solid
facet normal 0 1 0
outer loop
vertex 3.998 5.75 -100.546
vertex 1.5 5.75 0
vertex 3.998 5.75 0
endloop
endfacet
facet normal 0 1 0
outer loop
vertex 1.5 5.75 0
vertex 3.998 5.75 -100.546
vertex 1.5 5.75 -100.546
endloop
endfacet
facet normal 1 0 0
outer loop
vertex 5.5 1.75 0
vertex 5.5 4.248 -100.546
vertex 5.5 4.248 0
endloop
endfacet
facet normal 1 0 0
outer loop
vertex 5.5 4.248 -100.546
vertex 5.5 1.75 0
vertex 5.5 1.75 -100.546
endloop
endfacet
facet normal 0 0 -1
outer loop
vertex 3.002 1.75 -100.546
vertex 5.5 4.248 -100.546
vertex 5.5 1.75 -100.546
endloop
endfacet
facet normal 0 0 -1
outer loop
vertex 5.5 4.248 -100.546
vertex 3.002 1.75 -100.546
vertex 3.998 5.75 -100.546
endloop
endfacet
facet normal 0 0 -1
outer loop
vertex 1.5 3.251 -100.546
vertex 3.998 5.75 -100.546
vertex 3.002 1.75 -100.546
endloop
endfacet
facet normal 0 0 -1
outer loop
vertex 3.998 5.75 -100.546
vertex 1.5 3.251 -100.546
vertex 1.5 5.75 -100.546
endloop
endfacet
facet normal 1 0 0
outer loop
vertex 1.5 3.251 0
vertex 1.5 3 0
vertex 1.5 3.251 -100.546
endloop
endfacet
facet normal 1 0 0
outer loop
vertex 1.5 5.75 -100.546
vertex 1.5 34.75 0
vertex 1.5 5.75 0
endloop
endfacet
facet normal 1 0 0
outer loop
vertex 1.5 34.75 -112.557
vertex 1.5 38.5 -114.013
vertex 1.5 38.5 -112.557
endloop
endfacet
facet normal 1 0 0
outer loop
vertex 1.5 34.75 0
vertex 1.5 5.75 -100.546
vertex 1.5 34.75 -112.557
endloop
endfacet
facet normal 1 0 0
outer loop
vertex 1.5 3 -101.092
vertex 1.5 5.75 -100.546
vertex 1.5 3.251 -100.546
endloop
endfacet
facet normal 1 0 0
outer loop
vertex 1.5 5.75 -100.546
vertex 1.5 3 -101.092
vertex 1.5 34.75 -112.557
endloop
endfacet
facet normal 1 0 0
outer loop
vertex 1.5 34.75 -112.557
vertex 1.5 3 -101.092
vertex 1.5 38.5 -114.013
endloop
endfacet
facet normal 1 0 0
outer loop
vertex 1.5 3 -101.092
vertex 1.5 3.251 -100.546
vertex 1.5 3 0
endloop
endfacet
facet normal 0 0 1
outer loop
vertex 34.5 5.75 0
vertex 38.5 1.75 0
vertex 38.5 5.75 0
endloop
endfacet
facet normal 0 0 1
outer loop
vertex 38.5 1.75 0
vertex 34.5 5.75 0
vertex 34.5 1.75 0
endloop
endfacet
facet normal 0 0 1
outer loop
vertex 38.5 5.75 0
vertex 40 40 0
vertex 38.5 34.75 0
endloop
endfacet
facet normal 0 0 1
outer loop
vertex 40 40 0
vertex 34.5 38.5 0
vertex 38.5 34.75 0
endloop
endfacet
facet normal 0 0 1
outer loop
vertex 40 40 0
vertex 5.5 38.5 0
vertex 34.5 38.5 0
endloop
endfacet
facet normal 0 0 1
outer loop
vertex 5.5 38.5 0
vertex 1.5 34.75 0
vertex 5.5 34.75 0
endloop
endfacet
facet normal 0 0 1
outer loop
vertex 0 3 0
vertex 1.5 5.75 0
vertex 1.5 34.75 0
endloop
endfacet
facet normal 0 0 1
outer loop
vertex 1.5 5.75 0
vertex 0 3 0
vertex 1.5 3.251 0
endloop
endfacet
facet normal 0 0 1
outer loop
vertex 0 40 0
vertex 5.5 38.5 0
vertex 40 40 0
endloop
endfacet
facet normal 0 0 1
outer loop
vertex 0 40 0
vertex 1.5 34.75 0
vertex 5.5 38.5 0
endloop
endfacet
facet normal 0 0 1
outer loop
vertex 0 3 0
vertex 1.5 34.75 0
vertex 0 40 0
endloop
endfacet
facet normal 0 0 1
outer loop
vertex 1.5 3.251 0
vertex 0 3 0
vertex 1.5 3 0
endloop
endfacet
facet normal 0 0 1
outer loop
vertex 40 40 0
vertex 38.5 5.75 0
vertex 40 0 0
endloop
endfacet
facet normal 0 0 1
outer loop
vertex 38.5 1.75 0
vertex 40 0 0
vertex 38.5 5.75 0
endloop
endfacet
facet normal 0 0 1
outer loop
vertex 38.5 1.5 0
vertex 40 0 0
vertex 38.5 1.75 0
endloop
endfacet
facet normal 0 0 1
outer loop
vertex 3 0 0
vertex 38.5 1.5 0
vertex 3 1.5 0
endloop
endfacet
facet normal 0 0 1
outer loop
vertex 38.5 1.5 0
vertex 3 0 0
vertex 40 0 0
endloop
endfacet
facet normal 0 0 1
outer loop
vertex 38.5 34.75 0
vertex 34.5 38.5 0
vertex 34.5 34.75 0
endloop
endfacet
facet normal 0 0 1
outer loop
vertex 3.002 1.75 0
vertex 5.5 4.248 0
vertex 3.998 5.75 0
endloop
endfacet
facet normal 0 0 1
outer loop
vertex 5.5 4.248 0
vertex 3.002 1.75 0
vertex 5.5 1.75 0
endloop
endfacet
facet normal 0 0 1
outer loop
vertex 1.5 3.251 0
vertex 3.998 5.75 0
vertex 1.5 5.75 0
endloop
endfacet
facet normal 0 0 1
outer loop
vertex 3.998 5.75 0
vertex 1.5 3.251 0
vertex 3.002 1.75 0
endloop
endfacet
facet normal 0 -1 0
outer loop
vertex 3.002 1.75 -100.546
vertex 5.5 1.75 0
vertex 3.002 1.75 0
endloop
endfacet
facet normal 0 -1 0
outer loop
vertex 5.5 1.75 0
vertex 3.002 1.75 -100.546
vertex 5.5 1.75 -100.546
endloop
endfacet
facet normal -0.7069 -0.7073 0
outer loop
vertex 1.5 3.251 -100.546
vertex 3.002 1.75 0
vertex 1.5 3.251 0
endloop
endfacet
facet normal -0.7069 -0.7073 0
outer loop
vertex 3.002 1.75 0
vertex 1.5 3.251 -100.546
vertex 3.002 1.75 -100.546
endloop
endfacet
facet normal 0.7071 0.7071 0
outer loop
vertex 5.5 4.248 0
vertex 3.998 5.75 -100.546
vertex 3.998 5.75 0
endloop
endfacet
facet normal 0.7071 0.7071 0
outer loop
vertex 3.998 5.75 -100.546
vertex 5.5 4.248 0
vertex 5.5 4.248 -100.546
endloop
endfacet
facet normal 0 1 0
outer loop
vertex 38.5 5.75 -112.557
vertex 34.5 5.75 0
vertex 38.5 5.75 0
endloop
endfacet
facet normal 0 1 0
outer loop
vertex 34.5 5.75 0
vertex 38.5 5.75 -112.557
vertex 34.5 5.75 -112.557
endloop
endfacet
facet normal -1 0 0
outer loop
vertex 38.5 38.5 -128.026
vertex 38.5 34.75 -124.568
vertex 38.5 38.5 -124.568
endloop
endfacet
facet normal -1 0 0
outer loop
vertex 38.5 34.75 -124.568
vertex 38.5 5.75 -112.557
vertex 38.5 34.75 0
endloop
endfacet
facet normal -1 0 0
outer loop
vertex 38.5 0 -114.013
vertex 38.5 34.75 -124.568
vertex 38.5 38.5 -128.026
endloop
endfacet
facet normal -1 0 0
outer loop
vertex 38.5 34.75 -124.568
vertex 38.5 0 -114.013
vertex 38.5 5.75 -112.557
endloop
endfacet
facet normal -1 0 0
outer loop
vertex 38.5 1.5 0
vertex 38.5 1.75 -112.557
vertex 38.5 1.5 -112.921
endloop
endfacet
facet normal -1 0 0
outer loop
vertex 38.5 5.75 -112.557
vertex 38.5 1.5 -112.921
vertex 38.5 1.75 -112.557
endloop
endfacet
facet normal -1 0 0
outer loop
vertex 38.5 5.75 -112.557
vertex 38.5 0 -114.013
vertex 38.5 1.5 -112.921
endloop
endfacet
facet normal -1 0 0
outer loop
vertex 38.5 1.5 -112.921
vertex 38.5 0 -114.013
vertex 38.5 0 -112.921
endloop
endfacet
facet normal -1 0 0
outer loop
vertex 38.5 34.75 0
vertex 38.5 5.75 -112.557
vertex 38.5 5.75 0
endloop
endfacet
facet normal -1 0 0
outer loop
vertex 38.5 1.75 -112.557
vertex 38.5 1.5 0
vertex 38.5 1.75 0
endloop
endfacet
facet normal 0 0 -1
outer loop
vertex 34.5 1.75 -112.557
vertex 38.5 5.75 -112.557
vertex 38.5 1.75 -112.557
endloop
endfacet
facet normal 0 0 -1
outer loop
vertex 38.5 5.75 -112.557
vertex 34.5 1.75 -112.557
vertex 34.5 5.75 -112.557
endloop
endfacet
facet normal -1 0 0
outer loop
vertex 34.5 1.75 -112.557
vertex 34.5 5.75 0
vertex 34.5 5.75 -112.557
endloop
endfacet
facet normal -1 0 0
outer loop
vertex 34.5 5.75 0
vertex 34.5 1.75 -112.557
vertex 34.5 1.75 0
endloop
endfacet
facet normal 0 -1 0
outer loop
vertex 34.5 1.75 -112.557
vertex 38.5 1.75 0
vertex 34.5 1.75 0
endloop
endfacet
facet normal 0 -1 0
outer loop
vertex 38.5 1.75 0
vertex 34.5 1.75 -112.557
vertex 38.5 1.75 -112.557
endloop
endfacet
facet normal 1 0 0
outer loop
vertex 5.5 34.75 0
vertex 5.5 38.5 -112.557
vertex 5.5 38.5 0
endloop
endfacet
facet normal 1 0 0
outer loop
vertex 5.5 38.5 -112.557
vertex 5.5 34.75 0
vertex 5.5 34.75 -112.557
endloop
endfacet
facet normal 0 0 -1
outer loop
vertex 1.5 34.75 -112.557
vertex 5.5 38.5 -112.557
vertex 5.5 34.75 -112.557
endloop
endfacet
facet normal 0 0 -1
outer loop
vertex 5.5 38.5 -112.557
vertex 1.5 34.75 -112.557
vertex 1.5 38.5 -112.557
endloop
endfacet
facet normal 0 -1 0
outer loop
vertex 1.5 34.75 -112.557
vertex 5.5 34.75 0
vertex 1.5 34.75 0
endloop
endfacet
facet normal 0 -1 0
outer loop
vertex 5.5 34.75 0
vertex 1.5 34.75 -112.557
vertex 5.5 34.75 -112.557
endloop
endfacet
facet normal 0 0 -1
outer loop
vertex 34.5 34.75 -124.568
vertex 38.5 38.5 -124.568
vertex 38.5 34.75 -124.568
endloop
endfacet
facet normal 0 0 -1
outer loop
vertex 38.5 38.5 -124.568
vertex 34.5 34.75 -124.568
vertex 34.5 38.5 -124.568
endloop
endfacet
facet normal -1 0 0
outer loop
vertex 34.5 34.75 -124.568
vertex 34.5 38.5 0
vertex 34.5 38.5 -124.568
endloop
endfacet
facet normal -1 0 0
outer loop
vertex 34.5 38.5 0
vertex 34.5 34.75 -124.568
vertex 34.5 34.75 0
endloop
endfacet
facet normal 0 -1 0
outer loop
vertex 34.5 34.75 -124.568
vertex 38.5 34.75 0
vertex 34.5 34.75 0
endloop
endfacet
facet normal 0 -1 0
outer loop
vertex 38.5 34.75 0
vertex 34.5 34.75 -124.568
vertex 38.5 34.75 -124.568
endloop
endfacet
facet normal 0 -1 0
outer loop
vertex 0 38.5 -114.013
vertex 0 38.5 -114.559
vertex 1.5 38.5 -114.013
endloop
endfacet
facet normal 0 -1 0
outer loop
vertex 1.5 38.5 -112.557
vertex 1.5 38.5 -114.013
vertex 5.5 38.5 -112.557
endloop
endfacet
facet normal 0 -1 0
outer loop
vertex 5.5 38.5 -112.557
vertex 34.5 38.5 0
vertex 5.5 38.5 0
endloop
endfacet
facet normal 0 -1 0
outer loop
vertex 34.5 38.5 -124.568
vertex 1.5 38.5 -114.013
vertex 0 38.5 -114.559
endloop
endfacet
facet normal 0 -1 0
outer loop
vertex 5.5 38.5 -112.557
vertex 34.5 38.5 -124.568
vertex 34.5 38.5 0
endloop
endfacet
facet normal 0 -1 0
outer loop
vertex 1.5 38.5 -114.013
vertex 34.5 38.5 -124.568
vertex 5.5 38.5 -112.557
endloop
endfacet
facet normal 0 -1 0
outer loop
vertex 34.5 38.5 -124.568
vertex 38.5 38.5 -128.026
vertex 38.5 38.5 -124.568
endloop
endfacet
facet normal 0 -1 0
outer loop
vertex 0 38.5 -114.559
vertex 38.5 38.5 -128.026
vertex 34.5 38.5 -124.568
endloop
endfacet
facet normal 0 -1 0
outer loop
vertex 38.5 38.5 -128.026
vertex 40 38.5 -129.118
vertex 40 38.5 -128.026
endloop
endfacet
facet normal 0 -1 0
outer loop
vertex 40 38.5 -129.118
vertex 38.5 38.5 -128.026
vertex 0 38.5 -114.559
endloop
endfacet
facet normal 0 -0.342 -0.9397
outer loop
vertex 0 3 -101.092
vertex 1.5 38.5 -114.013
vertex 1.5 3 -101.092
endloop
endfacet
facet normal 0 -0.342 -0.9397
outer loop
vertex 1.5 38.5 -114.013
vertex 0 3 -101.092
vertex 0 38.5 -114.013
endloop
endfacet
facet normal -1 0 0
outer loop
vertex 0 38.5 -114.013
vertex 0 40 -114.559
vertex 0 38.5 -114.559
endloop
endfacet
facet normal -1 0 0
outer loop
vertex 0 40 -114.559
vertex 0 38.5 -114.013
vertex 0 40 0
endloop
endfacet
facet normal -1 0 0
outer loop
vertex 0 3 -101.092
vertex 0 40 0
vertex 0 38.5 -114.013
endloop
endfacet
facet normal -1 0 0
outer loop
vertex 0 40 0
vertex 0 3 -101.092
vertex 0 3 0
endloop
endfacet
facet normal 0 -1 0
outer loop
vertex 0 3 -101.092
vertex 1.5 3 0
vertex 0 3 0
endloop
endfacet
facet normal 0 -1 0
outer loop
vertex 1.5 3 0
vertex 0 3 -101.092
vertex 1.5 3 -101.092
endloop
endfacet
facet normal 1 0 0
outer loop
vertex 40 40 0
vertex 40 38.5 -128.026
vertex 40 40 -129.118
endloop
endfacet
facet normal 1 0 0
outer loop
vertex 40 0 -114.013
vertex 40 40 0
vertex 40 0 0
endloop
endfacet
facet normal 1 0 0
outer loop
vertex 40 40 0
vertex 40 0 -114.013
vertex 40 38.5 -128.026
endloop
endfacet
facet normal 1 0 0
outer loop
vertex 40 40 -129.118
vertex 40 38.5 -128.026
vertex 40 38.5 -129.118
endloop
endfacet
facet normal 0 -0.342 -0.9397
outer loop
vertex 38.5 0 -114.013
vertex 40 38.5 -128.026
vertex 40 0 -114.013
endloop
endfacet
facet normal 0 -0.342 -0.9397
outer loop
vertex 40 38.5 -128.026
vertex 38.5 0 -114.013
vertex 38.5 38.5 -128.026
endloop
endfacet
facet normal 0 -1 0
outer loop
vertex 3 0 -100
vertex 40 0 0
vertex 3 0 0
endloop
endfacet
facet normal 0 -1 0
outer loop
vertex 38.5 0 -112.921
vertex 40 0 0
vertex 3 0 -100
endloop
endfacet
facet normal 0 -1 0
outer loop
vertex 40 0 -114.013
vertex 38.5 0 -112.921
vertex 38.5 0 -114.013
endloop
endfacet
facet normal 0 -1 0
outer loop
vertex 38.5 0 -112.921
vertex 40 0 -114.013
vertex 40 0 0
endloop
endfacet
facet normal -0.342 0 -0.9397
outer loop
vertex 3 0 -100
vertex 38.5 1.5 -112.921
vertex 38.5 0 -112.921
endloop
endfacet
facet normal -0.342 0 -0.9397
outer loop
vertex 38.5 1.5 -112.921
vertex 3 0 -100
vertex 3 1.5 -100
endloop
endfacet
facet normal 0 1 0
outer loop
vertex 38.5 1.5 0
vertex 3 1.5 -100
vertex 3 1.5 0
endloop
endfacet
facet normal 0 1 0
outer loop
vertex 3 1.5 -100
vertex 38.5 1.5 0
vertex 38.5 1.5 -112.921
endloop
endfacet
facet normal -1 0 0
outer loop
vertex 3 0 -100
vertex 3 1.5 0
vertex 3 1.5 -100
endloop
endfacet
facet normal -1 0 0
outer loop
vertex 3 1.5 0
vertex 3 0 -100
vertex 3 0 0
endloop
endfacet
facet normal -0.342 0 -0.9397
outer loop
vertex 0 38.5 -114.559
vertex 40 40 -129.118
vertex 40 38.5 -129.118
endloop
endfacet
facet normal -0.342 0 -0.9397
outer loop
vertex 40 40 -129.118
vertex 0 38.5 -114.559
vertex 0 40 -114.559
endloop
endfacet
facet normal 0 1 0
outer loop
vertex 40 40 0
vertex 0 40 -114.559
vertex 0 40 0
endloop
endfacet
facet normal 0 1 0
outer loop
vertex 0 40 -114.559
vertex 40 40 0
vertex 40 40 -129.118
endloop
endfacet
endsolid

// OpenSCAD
// file: playwood.scad
module playwood(width=50, height=100, playwood_thickness = 1.5, roof_angle=20) 
{
    cut_depth = width*tan(roof_angle);
    
    color([0.9,0.9,0.9,0.6])
    translate([playwood_thickness,0,0])
    rotate([90,180,270])
    linear_extrude(playwood_thickness) 
    polygon(points=[[0, 0], [width,0], [width,height-cut_depth], [0, height], [0, 0]]);
}

playwood();
// file: vertical2x2.scad
module vertical2x2(length=100, wood_width = 4, roof_angle=20, slice=0,slice2=0, slice3=0) 
{
    half_w = wood_width/2;
    cut_depth = wood_width*tan(roof_angle);
    
    difference() 
    {
        color([0.9,0.6,0.3])
        translate([half_w,half_w,0])
        rotate([0,90,180])
        linear_extrude(wood_width) 
        polygon(points=[[0, half_w],
            [length+cut_depth/2,half_w],
            [length-cut_depth/2,-half_w],
            [0, -half_w], [0, half_w]]);
        
        if (slice > 0.001) {
            slice_d = sqrt(2) * slice*1.001;
            translate([-wood_width/2, 0, -0.5 *(length+cut_depth)+0.05])
            rotate([0,0,45])
            cube([slice_d, slice_d, length + cut_depth + 2.1], center=true); 
        }
        
        if (slice2 > 0.001) {
            slice_d2 = sqrt(2) * slice2*1.001;
            translate([wood_width/2, wood_width, -0.5 *(length+cut_depth)+0.05])
            rotate([0,0,45])
            cube([slice_d2, slice_d2, length + cut_depth + 2.1], center=true); 
        }

        if (slice3 > 0.001) {
            slice_d3 = sqrt(2) * slice3*1.001;
            translate([wood_width/2, 0, -0.5 *(length+cut_depth)+0.05])
            rotate([0,0,45])
            cube([slice_d3, slice_d3, length + cut_depth + 2.1], center=true); 
        }
    }
}

vertical2x2();
// main file
use <vertical2x2.scad>
use <playwood.scad>

module corner(corner_diam = 40, corner_height = 100, cut_depth=3, playwood_thickness= 1.5, roof_angle=20, explode=false) 
{
    wood_2x2_width = 4; 
    roof_angle = -roof_angle;
    delta = playwood_thickness + wood_2x2_width/2;
    cut_depth2=cut_depth-playwood_thickness;
    
    x1 = delta;
    y1 = delta;
    x2 = corner_diam - delta;
    y2 = corner_diam - delta;
    h1 = corner_height - (y1-wood_2x2_width/2) * tan(roof_angle);
    h2 = corner_height - (y2-wood_2x2_width/2) * tan(roof_angle);
    h3 = 2 * h2 - h1;
    
    expd = explode ? 20 : 0;
    
    
    translate([x1 - expd, delta/2 - expd, 0])
    vertical2x2(h1, wood_2x2_width, 0,cut_depth2, cut_depth2);
    
    translate([x2 + expd, delta/2 - expd, 0])
    vertical2x2(h2, wood_2x2_width, 0);
    
    translate([x1 - expd, y2-delta/2 + expd, 0])
    vertical2x2(h2, wood_2x2_width, 0);
    
    translate([x2 + expd, y2-delta/2 + expd, 0])
    vertical2x2(h3, wood_2x2_width, 0);
    
    translate([-expd,playwood_thickness+cut_depth2,0])
    playwood(corner_diam-2*playwood_thickness-cut_depth2, corner_height-(playwood_thickness+cut_depth2)*tan(roof_angle), playwood_thickness, roof_angle); 

    translate([corner_diam-playwood_thickness + expd,0,0])
    playwood(corner_diam-playwood_thickness, corner_height-(corner_diam-playwood_thickness)*tan(roof_angle), playwood_thickness, roof_angle); 
 
    translate([cut_depth,playwood_thickness - expd,0])
    rotate([0,0,270])
    playwood(corner_diam-cut_depth-playwood_thickness, corner_height, playwood_thickness, roof_angle); 
    
    translate([0,corner_diam + expd,0])
    rotate([0,0,270])
    playwood(corner_diam, corner_height - (corner_diam)*tan(roof_angle),  playwood_thickness, roof_angle); 
}


corner();
